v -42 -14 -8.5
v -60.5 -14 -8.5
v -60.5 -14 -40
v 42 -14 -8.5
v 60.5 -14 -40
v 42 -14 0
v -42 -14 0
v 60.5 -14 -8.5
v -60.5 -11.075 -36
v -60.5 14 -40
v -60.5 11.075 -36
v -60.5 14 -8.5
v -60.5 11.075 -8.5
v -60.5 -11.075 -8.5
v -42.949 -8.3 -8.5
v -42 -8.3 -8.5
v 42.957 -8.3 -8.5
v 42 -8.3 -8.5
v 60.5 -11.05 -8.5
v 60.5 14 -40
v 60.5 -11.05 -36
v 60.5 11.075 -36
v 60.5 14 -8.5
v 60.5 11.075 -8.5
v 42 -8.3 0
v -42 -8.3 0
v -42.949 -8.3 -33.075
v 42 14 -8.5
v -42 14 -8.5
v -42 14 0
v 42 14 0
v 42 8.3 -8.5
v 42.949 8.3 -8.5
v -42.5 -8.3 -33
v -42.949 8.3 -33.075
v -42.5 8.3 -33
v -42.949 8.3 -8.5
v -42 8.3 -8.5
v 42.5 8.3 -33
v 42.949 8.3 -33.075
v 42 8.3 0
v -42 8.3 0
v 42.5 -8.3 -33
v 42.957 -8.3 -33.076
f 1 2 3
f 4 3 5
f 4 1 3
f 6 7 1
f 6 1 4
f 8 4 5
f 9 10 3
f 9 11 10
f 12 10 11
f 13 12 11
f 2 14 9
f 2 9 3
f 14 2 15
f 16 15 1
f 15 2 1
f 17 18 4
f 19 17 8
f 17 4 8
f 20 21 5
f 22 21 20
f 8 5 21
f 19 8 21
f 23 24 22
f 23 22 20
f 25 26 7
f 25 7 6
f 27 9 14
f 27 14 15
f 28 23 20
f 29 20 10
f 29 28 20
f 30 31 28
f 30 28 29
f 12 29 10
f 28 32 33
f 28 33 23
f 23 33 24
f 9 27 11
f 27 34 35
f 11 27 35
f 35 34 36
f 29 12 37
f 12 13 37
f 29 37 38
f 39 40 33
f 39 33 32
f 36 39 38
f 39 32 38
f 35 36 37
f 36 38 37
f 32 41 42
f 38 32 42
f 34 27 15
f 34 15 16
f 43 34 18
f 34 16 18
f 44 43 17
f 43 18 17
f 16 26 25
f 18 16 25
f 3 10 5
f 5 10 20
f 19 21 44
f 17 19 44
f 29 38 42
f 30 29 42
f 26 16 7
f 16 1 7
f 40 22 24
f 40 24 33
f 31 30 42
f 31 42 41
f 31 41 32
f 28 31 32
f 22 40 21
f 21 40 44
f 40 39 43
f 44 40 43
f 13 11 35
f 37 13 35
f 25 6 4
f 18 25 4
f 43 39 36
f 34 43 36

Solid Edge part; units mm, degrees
sketch "Sketch1" plane through (0, 0, 0) normal (0, 0, 1) x (1, 0, 0)
  line L0 (-60.5, -14) -> (60.5, -14)
  line L1 (60.5, -14) -> (60.5, 14)
  line L2 (60.5, 14) -> (-60.5, 14)
  line L3 (-60.5, 14) -> (-60.5, -14)
extrude "Protrusion1" add sketch "Sketch1" against normal blind 40
sketch "Sketch2" plane through (0, -14, -20) normal (0, -1, 0) x (1, 0, 0)
  line L0 (60.5, 20) -> (42, 20)
  line L1 (42, 20) -> (42, 11.5)
  line L2 (42, 11.5) -> (60.5, 11.5)
  line L3 (60.5, 11.5) -> (60.5, 20)
  line L4 (-60.5, 11.5) -> (-42, 11.5)
  line L5 (-42, 11.5) -> (-42, 20)
  line L6 (-42, 20) -> (-60.5, 20)
  line L7 (-60.5, 20) -> (-60.5, 11.5)
extrude "ExtrudedCutout_1" cut sketch "Sketch2" against normal blind 28
extrude "Cutout1" [suppressed]
sketch "Sketch3" plane through (0, 11.075, 0) normal (0, 0, 1) x (1, 0, 0)
  line L0 (60.5, -2.925) -> (60.5, 0)
  line L1 (60.5, 0) -> (42, -2.925)
  line L2 (42, -2.925) -> (60.5, -2.925)
  line L3 (60.5, -19.225) -> (60.5, -22.125)
  line L4 (60.5, -22.125) -> (42, -19.225)
  line L5 (42, -19.225) -> (60.5, -19.225)
  line L6 (-60.5, -2.925) -> (-60.5, 0)
  line L7 (-60.5, 0) -> (-42, -2.925)
  line L8 (-42, -2.925) -> (-60.5, -2.925)
  line L9 (-60.5, -19.225) -> (-60.5, -22.15)
  line L10 (-60.5, -22.15) -> (-42, -19.225)
  line L11 (-42, -19.225) -> (-60.5, -19.225)
extrude "ExtrudedCutout_4" cut sketch "Sketch3" against normal blind 33
sketch "Sketch4" plane through (0, 0, 0) normal (0, 0, 1) x (1, 0, 0)
  line L0 (-60.5, -8.3) -> (60.5, -8.3)
  line L1 (60.5, -8.3) -> (60.5, 8.3)
  line L2 (60.5, 8.3) -> (-60.5, 8.3)
  line L3 (-60.5, 8.3) -> (-60.5, -8.3)
extrude "ExtrudedCutout_5" cut sketch "Sketch4" against normal blind 33
chamfer "Chamfer_2" distance 3 distance2 18 1 edges at (-60.5, 0, -33) measured on face at (-60.5, 9.6133, -34.435)
chamfer "Chamfer_3" distance 3 distance2 18 1 edges at (60.5, 0.0125, -33) measured on face at (60.5, -9.6133, -34.435)
